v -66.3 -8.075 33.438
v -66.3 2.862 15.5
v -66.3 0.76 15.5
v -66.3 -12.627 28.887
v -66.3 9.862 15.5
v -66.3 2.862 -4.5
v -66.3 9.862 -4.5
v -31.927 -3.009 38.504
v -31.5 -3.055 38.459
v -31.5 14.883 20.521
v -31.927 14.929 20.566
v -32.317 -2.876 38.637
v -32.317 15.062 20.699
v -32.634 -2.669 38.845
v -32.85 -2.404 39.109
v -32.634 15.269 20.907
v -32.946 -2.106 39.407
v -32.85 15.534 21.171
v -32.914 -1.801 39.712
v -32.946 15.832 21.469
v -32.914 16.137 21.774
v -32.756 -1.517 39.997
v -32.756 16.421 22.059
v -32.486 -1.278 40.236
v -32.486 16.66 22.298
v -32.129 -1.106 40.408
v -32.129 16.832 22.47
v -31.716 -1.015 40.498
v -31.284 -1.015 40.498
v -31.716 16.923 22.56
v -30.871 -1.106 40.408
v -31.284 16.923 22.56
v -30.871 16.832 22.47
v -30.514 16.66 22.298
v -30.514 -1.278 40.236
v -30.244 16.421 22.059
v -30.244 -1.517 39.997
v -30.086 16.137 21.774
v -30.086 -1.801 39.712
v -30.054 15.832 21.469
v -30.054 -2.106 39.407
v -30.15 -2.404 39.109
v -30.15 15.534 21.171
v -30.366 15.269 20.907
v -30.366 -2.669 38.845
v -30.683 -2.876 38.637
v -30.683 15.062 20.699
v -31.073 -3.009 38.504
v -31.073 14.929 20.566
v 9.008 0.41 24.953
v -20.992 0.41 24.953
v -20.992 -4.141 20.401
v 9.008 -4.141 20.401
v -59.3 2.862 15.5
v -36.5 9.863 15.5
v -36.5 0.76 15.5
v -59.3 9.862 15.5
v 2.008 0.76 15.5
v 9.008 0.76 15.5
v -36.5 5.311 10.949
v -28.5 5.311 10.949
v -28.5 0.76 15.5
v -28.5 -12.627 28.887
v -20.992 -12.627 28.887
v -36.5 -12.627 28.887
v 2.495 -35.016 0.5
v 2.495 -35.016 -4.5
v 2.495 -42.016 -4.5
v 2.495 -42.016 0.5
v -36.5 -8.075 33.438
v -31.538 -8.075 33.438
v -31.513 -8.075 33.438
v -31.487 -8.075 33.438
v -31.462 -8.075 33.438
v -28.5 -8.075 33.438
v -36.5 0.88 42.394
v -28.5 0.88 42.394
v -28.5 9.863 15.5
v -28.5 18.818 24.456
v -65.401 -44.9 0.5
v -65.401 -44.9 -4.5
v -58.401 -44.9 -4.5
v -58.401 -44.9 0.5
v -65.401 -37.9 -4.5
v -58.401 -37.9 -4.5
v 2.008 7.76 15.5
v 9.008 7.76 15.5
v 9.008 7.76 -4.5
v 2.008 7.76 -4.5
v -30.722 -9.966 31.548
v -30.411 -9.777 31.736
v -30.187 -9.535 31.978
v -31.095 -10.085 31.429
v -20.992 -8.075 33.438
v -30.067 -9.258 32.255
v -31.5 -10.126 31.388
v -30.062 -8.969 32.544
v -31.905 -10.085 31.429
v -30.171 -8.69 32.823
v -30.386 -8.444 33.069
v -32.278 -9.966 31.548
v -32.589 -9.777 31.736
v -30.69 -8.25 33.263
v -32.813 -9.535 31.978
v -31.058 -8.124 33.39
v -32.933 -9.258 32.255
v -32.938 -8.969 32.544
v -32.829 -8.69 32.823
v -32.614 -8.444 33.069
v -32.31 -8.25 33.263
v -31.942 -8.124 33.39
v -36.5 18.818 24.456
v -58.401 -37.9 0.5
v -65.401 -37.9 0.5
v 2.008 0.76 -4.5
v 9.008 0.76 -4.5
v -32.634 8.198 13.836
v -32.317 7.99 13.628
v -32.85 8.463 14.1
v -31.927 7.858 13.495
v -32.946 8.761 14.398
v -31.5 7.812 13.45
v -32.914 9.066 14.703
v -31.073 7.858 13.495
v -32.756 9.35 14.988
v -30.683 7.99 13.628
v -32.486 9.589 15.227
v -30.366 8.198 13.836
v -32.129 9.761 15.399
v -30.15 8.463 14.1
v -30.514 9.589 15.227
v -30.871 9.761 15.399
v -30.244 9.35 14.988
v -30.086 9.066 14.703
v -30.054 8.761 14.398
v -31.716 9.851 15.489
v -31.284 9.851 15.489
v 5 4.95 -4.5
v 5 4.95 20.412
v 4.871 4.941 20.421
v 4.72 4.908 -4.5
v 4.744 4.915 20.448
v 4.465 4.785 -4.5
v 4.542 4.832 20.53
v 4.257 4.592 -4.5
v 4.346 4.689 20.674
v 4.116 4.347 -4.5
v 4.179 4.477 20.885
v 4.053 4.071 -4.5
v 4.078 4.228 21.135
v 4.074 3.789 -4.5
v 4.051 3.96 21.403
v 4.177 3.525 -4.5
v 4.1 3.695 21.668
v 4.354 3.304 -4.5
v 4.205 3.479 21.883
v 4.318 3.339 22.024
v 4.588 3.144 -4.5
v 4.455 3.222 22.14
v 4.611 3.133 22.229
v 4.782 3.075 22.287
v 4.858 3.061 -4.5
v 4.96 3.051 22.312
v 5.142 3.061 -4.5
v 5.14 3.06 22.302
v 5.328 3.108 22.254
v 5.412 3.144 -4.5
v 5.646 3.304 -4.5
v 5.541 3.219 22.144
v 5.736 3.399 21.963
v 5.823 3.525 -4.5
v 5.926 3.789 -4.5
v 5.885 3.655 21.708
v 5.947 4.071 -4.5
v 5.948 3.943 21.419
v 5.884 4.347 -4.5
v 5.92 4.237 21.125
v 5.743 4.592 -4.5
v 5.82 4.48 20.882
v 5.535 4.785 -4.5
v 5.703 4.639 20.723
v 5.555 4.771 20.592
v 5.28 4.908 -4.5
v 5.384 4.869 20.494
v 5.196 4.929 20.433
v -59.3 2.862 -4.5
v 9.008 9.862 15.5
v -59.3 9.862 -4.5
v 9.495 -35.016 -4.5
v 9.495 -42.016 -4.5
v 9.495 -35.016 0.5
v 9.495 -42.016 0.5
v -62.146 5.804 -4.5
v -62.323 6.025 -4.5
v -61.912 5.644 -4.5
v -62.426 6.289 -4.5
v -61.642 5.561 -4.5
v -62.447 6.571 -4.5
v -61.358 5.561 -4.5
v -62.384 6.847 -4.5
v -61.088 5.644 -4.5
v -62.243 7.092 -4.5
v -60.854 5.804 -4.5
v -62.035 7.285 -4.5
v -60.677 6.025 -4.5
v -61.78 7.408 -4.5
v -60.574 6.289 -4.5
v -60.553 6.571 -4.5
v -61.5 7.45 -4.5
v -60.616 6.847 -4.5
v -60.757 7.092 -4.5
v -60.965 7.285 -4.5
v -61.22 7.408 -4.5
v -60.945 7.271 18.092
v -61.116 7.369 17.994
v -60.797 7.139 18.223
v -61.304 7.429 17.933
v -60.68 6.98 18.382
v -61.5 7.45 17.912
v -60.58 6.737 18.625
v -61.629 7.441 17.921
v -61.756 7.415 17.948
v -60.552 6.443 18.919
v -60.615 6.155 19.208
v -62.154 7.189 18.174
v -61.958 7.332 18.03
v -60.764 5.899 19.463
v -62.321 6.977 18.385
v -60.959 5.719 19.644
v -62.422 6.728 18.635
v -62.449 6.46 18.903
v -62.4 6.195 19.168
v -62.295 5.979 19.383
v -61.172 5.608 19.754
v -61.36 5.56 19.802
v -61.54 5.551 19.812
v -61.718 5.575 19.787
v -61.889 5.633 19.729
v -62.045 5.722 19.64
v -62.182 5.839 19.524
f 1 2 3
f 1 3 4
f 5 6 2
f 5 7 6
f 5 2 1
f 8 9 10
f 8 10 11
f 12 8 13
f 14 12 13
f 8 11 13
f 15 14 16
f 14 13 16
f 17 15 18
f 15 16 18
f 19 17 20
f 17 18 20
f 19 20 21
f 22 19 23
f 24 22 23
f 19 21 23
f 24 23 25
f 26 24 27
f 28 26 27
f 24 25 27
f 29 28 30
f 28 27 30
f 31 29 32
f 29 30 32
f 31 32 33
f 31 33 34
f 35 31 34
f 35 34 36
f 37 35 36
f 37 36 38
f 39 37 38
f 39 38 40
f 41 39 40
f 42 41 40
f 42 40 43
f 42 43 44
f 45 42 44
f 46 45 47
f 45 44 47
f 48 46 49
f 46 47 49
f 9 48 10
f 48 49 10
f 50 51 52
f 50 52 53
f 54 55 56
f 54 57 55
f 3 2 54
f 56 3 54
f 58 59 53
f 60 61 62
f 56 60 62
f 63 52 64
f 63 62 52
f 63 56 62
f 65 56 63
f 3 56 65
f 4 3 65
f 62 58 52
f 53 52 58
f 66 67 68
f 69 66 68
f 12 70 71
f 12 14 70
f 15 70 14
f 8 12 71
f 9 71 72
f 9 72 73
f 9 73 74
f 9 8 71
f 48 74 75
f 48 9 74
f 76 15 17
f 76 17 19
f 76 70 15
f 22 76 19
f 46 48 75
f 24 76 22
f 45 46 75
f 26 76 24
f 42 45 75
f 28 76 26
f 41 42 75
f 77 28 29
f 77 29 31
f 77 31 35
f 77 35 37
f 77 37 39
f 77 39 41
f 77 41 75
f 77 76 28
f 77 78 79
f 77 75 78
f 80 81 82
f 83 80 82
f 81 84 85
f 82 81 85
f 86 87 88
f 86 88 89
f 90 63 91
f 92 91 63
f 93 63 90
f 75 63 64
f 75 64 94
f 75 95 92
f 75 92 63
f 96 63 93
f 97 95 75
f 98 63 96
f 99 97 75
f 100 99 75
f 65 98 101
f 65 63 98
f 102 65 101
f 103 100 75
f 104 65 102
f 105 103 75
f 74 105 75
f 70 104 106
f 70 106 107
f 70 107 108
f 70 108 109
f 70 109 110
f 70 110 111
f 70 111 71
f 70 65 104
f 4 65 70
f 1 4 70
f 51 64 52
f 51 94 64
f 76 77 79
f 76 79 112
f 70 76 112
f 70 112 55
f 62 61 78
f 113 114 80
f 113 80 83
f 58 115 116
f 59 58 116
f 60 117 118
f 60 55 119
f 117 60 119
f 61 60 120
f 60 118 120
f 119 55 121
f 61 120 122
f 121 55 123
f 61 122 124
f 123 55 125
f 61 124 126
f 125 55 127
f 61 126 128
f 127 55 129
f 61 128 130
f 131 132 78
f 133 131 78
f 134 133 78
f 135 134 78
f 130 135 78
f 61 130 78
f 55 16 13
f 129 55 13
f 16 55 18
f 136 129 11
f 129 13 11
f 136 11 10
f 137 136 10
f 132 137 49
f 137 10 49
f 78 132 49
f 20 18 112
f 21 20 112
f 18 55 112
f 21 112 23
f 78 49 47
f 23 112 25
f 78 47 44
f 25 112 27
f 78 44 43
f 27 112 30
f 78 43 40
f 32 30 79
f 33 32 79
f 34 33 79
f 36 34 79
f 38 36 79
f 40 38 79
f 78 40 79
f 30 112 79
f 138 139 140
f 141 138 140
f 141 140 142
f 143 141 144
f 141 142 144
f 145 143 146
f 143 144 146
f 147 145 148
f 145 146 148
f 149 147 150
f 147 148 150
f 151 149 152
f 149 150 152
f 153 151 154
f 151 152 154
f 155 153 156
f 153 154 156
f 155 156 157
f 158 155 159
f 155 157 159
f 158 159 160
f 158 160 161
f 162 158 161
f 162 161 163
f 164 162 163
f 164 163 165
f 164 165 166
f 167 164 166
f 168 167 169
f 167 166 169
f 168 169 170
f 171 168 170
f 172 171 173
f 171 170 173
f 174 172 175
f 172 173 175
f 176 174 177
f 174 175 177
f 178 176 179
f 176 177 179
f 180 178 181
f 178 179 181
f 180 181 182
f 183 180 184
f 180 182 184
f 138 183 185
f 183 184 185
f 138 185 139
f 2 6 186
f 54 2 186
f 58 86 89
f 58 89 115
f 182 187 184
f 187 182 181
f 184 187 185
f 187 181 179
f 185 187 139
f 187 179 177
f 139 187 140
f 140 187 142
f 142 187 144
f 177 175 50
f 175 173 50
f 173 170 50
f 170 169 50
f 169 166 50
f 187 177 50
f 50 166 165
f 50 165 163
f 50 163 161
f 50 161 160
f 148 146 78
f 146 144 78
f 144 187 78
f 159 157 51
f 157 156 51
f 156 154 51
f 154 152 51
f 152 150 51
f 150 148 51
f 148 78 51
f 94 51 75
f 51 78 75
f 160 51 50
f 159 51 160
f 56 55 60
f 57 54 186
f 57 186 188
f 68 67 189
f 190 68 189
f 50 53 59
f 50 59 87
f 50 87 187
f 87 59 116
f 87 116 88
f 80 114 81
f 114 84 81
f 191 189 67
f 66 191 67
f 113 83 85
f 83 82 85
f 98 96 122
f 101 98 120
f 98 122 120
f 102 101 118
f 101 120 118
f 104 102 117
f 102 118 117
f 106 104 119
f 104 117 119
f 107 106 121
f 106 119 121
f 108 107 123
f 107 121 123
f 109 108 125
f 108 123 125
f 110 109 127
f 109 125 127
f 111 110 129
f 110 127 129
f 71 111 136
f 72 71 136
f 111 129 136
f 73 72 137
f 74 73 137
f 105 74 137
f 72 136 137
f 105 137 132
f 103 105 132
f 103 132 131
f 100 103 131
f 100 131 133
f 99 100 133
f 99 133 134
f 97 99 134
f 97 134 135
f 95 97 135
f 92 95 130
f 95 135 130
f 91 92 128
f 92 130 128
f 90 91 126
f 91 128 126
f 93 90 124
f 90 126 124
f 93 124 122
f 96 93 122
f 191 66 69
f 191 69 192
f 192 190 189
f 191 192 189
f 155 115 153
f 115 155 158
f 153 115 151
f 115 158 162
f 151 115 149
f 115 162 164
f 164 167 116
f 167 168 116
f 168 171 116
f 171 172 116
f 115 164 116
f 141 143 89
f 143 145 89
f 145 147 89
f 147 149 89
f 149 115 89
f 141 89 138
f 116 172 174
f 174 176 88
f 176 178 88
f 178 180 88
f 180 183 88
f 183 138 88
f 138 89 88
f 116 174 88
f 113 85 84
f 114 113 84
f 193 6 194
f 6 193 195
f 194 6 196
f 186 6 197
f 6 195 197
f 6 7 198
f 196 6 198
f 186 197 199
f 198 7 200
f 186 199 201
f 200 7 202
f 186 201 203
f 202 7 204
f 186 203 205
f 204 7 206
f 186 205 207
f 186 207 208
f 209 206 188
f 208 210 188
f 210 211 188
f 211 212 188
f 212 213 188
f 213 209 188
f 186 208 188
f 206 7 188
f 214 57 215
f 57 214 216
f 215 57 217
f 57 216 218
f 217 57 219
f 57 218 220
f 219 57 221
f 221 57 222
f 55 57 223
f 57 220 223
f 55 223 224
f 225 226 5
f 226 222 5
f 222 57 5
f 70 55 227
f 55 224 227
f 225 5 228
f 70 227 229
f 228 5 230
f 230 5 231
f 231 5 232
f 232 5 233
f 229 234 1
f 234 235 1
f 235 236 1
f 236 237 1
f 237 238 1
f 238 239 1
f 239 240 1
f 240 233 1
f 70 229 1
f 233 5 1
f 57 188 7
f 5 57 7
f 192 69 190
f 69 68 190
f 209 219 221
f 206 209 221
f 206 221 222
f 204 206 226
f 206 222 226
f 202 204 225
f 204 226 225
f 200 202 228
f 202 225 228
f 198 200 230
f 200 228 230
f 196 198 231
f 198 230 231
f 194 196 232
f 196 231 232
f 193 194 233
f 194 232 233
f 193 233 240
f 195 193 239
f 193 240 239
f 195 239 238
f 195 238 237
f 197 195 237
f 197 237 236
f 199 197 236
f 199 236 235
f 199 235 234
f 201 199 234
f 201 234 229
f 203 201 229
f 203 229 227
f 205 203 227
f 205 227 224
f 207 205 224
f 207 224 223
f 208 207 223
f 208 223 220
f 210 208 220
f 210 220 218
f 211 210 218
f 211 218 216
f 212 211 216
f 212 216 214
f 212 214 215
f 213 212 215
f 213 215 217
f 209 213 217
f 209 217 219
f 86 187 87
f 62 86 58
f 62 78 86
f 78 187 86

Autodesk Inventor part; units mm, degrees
ref_plane "YZ Plane" through (0, 0, 0) normal (1, 0, 0) x (0, 1, 0)
ref_plane "XZ Plane" through (0, 0, 0) normal (0, 1, 0) x (-1, 0, 0)
ref_plane "XY Plane" through (0, 0, 0) normal (0, 0, 1) x (1, 0, 0)
ref_plane "Work Plane1" through (-61.5, 6.5, -4.5) normal (0, 0, 1) x (1, 0, 0)
sketch "Sketch1" plane through (-61.5, 6.5, -4.5) normal (0, 0, 1) x (1, 0, 0)
  circle A0 centre (0, 0) radius 1.7 construction
  circle A1 centre (66.5, -2.5) radius 1.1 construction
  circle A2 centre (66.5, -45.5) radius 1.1 construction
  circle A3 centre (0.5, -48) radius 1.7 construction
  line L0 (70.5084, 1.2598) -> (63.5084, 1.2598)
  line L1 (63.5084, 1.2598) -> (63.5084, -5.7402)
  line L2 (63.5084, -5.7402) -> (70.5084, -5.7402)
  line L3 (70.5084, -5.7402) -> (70.5084, 1.2598)
  circle A4 centre (68.0875, -0.9125) radius 1.1 construction
  line L4 (70.9947, -41.5157) -> (63.9947, -41.5157)
  line L5 (63.9947, -41.5157) -> (63.9947, -48.5157)
  line L6 (63.9947, -48.5157) -> (70.9947, -48.5157)
  line L7 (70.9947, -48.5157) -> (70.9947, -41.5157)
  circle A5 centre (69.675, 0.675) radius 1.1 construction
  line L8 (3.0987, -44.4) -> (-3.9013, -44.4)
  line L9 (-3.9013, -44.4) -> (-3.9013, -51.4)
  line L10 (-3.9013, -51.4) -> (3.0987, -51.4)
  line L11 (3.0987, -51.4) -> (3.0987, -44.4)
  circle A6 centre (71.2625, 2.2625) radius 1.1 construction
  line L12 (2.2, 3.3625) -> (-4.8, 3.3625)
  line L13 (-4.8, 3.3625) -> (-4.8, -3.6375)
  line L14 (-4.8, -3.6375) -> (2.2, -3.6375)
  line L15 (2.2, -3.6375) -> (2.2, 3.3625)
  point P0 (61.5, -6.5)
  point P1 (63.0875, -4.9125)
  point P2 (64.675, -3.325)
  point P3 (66.2625, -1.7375)
  dimension "d4" = 7
  dimension "d5" = 7
  dimension "d6" = 7
  dimension "d7" = 7
  dimension "d8" = 7
  dimension "d9" = 7
  dimension "d10" = 7
  dimension "d11" = 7
extrude "Extrusion1" add sketch "Sketch1" along normal blind 5
sketch "Sketch2" plane through (-61.5, 6.5, 0.5) normal (0, 0, 1) x (1, 0, 0)
  line L0 (70.5084, 1.2598) -> (63.5084, 1.2598) projected
  line L1 (63.5084, 1.2598) -> (63.5084, -5.7402) projected
  line L2 (63.5084, -5.7402) -> (70.5084, -5.7402) projected
  line L3 (70.5084, -5.7402) -> (70.5084, 1.2598) projected
  line L4 (-4.8, 3.3625) -> (-4.8, -3.6375) projected
  line L5 (-4.8, -3.6375) -> (2.2, -3.6375) projected
  line L6 (2.2, -3.6375) -> (2.2, 3.3625) projected
  line L7 (2.2, 3.3625) -> (-4.8, 3.3625) projected
  point P0 (61.5, -6.5)
extrude "Extrusion2" add sketch "Sketch2" along normal blind 15
sketch "Sketch3" plane through (-66.3, 2.8625, -4.5) normal (-1, 0, 0) x (0, 0, 1)
  line L0 (0, 4.8973) -> (0, -2.1027) projected
  line L1 (0, -2.1027) -> (20, -2.1027) projected
  line L2 (20, 4.8973) -> (20, -2.1027) projected
  line L3 (0, 4.8973) -> (20, 4.8973) projected
  line L4 (0, 0) -> (0, 7) projected
  line L5 (0, 0) -> (20, 0) projected
  line L6 (20, 7) -> (20, 0) projected
  line L7 (0, 7) -> (20, 7) projected
  line L8 (0, -2.1027) -> (20, -2.1027) projected
  line L9 (20, -2.1027) -> (20, 7)
  line L10 (0, 7) -> (20, 7) projected
  line L11 (20, 7) -> (24.5513, 2.4487)
  line L12 (20, 7) -> (26.4366, 7) construction
  line L13 (24.5513, 2.4487) -> (20, -2.1027)
  line L14 (7.5, -41.3758) -> (74.2482, 25.3723) construction
  line L15 (24.5513, 2.4487) -> (20, -2.1027)
  line L16 (20, -2.1027) -> (33.3866, -15.4893)
  line L17 (33.3866, -15.4893) -> (37.9379, -10.9379)
  line L18 (37.9379, -10.9379) -> (24.5513, 2.4487)
  point P0 (4.5, -2.8625)
  dimension "d16" = 45
extrude "Extrusion3" add sketch "Sketch3" against normal up to surface (75.3084 mm away) contours L6 L11 L13 L2 | L13 L18 L17 L16
sketch "Sketch4" plane through (-61.5, 6.5, -4.5) normal (0, 0, -1) x (-1, 0, 0)
  circle A0 centre (-66.5, -2.5) radius 1.1 projected
  circle A1 centre (0, 0) radius 1.1 projected
  point P0 (-61.5, -6.5)
hole "Hole1" at (5, 4, -4.5) at (-61.5, 6.5, -4.5) direction (0, 0, 1) diameter 1.9 end through all
sketch "Sketch5" plane through (-66.3, -8.0754, 33.4379) normal (0, 0.7071068, 0.7071068) x (1, 0, 0)
  line L0 (31.8, 0) -> (67.6266, 0) projected
  line L1 (75.3084, 25.3681) -> (75.3084, 0) projected
  line L2 (75.3084, 0) -> (45.3084, 0)
  line L3 (45.3084, 0) -> (45.3084, 12)
  line L4 (45.3084, 12) -> (75.3084, 12)
  line L5 (75.3084, 12) -> (75.3084, 0)
  point P0 (66.3, 29.3544)
  dimension "d28" = 30
  dimension "d29" = 12
extrude "Extrusion5" cut sketch "Sketch5" against normal up to surface (6.4366 mm away)
sketch "Sketch6" plane through (-66.3, -8.0754, 33.4379) normal (0, -0.7071068, 0.7071068) x (1, 0, 0)
  line L0 (45.3084, -6.4366) -> (45.3084, 0) projected
  line L1 (0, 0) -> (45.3084, 0) projected
  line L2 (0, -6.4366) -> (0, 0) projected
  line L3 (0, -6.4366) -> (45.3084, -6.4366) projected
  circle A0 centre (34.6, 8.3505) radius 1.6 projected
  circle A1 centre (34.6, -1.6495) radius 1.6 projected
  line L4 (29.8, -43.0457) -> (29.8, 51.3505) construction
  line L5 (37.8, 3.4505) -> (37.8, -42.9495) construction
  line L6 (0, -6.4366) -> (45.3084, -6.4366) construction
  line L7 (29.8, -6.4366) -> (37.8, -6.4366) construction
  line L8 (37.8, -6.4366) -> (37.8, 12.6655) construction
  line L9 (37.8, 12.6655) -> (29.8, 12.6655) construction
  line L10 (29.8, 12.6655) -> (29.8, -6.4366) construction
  line L11 (29.8, -6.4366) -> (37.8, -6.4366)
  line L12 (37.8, -6.4366) -> (37.8, 12.6655)
  line L13 (37.8, 12.6655) -> (29.8, 12.6655)
  line L14 (29.8, 12.6655) -> (29.8, -6.4366)
  point P0 (66.3, -17.934)
extrude "Extrusion6" add sketch "Sketch6" against normal up to surface (25.3681 mm away) contours L3 L14 L1 L12 | L1 L14 L13 L12 | A0 | A1
sketch "Sketch7" plane through (-66.3, -12.6268, 28.8866) normal (0, -0.7071068, 0.7071068) x (1, 0, 0)
  circle A0 centre (34.8, 4.987) radius 2.65 projected
  circle A1 centre (34.8, 14.987) radius 2.65 projected
  point P0 (66.3, -11.4974)
hole "Hole2" at (-31.5, -9.1004, 32.413) at (-31.5, -2.0293, 39.484) direction (0, 0.7071068, -0.7071068) diameter 2.9 end through all
properties part number "30_CUBE_openSIM_DLP200EVM_Holder"
